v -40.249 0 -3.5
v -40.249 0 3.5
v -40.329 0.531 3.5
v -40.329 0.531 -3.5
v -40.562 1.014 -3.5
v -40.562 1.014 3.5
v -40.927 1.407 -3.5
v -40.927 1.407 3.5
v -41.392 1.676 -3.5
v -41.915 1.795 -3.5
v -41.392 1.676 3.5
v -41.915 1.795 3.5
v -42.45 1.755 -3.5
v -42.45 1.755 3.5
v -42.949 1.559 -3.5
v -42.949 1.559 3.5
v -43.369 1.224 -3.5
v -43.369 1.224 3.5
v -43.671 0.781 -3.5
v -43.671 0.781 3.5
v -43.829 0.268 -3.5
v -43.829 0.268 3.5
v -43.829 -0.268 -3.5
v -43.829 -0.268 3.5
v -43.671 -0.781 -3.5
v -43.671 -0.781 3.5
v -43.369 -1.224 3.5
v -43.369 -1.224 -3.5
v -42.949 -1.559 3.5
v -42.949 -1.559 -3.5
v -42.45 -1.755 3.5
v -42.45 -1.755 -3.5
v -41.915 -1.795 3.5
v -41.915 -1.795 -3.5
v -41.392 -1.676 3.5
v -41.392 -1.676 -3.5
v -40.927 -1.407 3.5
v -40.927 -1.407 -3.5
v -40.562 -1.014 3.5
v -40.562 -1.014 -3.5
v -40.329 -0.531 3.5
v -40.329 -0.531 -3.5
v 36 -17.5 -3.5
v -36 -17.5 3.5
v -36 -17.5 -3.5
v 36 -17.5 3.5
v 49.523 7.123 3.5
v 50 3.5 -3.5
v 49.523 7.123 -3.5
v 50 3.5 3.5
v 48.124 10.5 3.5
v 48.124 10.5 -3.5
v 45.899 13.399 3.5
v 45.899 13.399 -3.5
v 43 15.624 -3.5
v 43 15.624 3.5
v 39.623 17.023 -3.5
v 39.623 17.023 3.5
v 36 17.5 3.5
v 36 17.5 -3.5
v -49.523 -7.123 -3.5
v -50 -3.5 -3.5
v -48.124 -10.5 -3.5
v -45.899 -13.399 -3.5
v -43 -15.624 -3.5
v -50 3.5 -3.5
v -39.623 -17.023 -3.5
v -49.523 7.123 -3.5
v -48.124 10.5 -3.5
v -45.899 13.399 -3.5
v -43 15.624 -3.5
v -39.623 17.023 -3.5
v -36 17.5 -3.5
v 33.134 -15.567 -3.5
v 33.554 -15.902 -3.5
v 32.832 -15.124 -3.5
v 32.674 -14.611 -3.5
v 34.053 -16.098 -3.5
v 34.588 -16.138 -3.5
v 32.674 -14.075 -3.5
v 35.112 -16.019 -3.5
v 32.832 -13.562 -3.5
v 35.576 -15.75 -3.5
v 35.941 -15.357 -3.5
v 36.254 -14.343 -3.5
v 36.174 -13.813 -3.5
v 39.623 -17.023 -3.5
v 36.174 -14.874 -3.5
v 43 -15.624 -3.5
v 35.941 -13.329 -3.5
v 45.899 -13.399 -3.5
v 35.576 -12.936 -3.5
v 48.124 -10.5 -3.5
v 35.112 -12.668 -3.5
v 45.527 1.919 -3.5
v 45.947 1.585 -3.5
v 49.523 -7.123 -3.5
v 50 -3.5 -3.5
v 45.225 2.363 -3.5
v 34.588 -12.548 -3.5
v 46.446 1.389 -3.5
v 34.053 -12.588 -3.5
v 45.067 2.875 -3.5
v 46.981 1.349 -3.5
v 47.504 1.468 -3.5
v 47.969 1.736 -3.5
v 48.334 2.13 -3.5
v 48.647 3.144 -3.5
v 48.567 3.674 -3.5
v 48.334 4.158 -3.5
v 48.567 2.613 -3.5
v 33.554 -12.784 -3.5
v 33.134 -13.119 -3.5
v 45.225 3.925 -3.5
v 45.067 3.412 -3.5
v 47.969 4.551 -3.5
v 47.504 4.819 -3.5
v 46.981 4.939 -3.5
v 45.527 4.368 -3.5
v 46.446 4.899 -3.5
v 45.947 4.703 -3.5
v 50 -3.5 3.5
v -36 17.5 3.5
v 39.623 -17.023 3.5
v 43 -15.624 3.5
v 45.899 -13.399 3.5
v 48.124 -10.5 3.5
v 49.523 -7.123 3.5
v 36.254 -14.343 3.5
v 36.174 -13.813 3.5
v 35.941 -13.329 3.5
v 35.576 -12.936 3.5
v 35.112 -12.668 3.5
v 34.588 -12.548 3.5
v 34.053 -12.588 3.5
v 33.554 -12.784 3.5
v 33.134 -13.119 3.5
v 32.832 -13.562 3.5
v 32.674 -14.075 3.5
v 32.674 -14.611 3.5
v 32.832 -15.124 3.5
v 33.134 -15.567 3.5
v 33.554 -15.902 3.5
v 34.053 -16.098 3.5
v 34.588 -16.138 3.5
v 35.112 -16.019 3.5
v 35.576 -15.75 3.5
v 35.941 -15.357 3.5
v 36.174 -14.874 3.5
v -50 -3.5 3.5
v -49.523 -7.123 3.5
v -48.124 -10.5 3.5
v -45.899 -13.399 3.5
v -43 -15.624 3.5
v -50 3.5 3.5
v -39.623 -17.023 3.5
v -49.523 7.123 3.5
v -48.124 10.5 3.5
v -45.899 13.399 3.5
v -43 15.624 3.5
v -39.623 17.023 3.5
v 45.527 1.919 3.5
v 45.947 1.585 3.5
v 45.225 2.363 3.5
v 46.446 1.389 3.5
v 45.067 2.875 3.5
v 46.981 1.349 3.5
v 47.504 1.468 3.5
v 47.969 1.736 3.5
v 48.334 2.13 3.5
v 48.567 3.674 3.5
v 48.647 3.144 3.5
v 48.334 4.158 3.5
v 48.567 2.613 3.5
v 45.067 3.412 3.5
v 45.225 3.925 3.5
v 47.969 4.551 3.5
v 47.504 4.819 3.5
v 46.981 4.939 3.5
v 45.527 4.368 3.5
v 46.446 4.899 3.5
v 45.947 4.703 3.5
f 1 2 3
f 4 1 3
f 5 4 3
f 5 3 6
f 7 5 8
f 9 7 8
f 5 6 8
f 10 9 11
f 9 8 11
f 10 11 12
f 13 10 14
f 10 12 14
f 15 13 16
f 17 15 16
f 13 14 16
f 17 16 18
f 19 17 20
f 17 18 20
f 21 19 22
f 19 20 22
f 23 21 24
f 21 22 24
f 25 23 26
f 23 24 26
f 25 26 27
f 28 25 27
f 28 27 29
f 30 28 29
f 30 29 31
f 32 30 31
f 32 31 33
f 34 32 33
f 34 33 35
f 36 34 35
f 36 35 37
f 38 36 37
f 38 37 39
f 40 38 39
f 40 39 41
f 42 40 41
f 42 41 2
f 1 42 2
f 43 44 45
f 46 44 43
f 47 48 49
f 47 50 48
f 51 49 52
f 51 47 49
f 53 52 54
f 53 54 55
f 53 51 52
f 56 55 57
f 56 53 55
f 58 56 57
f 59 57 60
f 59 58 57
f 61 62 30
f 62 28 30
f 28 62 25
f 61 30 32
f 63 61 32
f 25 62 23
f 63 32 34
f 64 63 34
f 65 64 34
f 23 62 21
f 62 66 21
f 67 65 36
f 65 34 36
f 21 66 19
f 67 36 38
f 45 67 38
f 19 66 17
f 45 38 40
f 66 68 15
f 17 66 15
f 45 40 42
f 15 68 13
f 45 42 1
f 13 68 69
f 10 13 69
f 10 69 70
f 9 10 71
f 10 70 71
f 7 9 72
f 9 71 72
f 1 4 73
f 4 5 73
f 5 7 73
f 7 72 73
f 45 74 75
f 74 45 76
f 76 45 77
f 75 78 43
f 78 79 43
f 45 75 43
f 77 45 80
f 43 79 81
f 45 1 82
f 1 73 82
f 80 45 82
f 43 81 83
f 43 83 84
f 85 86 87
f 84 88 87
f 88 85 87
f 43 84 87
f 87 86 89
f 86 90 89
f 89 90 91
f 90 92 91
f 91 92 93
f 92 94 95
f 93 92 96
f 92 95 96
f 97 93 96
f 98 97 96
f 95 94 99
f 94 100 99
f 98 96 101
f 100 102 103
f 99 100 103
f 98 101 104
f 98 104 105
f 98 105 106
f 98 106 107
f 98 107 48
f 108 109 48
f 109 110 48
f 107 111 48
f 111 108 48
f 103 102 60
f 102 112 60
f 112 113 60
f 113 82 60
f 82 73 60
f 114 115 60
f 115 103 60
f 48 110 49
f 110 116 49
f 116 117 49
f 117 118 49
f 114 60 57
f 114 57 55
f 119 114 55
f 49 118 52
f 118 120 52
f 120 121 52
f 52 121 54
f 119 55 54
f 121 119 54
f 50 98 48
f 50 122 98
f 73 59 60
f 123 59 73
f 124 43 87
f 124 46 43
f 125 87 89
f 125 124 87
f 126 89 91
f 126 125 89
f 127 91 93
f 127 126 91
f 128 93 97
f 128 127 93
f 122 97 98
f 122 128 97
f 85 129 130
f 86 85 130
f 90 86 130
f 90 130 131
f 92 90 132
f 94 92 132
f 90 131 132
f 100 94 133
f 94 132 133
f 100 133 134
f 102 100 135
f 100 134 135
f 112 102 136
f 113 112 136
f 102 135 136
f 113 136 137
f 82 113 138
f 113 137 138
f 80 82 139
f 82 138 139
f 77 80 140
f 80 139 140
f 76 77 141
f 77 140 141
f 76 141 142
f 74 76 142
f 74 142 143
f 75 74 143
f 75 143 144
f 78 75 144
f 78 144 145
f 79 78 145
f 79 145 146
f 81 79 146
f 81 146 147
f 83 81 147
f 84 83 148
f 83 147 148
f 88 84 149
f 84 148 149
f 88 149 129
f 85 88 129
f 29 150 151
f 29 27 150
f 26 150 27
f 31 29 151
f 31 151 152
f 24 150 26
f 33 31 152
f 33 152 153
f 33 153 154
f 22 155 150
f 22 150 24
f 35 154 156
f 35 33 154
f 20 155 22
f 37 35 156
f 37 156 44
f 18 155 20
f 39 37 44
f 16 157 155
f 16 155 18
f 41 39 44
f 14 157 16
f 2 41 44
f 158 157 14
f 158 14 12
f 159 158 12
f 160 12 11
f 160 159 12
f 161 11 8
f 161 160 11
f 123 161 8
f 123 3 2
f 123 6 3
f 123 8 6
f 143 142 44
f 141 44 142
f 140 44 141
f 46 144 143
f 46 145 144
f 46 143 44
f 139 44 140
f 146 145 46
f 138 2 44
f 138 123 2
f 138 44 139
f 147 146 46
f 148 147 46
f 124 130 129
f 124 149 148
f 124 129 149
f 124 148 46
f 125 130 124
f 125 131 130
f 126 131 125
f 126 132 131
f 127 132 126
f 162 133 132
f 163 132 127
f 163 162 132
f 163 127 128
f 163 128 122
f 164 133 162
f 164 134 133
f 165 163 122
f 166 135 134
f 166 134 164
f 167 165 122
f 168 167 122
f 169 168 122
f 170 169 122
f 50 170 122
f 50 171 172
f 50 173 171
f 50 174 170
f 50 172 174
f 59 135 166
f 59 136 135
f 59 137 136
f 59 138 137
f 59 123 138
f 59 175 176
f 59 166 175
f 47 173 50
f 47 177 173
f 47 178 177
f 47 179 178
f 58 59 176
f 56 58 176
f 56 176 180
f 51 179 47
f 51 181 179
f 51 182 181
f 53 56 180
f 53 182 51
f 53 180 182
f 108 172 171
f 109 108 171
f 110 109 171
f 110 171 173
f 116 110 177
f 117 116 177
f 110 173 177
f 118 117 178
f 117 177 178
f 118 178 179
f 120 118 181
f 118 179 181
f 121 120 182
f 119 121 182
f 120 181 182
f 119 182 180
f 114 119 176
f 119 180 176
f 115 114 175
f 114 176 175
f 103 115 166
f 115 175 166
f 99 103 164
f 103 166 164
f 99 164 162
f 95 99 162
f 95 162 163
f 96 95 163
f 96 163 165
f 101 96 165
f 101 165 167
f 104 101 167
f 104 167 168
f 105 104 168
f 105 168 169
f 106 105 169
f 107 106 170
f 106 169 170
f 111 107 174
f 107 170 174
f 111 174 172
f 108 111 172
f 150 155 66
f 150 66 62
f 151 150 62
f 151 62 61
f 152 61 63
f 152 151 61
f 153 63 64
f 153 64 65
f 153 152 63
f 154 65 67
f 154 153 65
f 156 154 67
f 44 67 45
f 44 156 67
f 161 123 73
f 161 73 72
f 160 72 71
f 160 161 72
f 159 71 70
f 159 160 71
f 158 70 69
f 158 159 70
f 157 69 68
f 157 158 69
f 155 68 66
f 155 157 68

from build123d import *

# Parameters (mm, degrees)
F1_DEPTH = 3.5
F2_R     = 1.8
F3_DEPTH = 11
F4_R     = 1.8
F5_DEPTH = 7


with BuildPart() as f1:
    # F0 (on Top) → F1 (new body, symmetric)
    with BuildSketch(Plane.XY):
        with BuildLine():
            ThreePointArc((50, 3.5), (45.899495, 13.399495), (36, 17.5))
            Line((36, 17.5), (-36, 17.5))
            ThreePointArc((-36, 17.5), (-45.899495, 13.399495), (-50, 3.5))
            Line((-50, 3.5), (-50, -3.5))
            ThreePointArc((-50, -3.5), (-45.899495, -13.399495), (-36, -17.5))
            Line((-36, -17.5), (36, -17.5))
            ThreePointArc((36, -17.5), (45.899495, -13.399495), (50, -3.5))
            Line((50, -3.5), (50, 3.5))
        make_face()
    extrude(amount=F1_DEPTH, both=True)

    # F2 (on face) → F3 (cut)
    with BuildSketch(Plane.XY.offset(3.5)):
        with Locations((-42.049296, 0)):
            Circle(F2_R)
    extrude(amount=-F3_DEPTH, mode=Mode.SUBTRACT)

    # F4 (on face) → F5 (cut)
    with BuildSketch(Plane.XY.offset(3.5)):
        with Locations((46.846839, 3.143723)):
            Circle(F4_R)
        with Locations((34.45389, -14.343117)):
            Circle(F4_R)
    extrude(amount=-F5_DEPTH, mode=Mode.SUBTRACT)


solid = f1.part
